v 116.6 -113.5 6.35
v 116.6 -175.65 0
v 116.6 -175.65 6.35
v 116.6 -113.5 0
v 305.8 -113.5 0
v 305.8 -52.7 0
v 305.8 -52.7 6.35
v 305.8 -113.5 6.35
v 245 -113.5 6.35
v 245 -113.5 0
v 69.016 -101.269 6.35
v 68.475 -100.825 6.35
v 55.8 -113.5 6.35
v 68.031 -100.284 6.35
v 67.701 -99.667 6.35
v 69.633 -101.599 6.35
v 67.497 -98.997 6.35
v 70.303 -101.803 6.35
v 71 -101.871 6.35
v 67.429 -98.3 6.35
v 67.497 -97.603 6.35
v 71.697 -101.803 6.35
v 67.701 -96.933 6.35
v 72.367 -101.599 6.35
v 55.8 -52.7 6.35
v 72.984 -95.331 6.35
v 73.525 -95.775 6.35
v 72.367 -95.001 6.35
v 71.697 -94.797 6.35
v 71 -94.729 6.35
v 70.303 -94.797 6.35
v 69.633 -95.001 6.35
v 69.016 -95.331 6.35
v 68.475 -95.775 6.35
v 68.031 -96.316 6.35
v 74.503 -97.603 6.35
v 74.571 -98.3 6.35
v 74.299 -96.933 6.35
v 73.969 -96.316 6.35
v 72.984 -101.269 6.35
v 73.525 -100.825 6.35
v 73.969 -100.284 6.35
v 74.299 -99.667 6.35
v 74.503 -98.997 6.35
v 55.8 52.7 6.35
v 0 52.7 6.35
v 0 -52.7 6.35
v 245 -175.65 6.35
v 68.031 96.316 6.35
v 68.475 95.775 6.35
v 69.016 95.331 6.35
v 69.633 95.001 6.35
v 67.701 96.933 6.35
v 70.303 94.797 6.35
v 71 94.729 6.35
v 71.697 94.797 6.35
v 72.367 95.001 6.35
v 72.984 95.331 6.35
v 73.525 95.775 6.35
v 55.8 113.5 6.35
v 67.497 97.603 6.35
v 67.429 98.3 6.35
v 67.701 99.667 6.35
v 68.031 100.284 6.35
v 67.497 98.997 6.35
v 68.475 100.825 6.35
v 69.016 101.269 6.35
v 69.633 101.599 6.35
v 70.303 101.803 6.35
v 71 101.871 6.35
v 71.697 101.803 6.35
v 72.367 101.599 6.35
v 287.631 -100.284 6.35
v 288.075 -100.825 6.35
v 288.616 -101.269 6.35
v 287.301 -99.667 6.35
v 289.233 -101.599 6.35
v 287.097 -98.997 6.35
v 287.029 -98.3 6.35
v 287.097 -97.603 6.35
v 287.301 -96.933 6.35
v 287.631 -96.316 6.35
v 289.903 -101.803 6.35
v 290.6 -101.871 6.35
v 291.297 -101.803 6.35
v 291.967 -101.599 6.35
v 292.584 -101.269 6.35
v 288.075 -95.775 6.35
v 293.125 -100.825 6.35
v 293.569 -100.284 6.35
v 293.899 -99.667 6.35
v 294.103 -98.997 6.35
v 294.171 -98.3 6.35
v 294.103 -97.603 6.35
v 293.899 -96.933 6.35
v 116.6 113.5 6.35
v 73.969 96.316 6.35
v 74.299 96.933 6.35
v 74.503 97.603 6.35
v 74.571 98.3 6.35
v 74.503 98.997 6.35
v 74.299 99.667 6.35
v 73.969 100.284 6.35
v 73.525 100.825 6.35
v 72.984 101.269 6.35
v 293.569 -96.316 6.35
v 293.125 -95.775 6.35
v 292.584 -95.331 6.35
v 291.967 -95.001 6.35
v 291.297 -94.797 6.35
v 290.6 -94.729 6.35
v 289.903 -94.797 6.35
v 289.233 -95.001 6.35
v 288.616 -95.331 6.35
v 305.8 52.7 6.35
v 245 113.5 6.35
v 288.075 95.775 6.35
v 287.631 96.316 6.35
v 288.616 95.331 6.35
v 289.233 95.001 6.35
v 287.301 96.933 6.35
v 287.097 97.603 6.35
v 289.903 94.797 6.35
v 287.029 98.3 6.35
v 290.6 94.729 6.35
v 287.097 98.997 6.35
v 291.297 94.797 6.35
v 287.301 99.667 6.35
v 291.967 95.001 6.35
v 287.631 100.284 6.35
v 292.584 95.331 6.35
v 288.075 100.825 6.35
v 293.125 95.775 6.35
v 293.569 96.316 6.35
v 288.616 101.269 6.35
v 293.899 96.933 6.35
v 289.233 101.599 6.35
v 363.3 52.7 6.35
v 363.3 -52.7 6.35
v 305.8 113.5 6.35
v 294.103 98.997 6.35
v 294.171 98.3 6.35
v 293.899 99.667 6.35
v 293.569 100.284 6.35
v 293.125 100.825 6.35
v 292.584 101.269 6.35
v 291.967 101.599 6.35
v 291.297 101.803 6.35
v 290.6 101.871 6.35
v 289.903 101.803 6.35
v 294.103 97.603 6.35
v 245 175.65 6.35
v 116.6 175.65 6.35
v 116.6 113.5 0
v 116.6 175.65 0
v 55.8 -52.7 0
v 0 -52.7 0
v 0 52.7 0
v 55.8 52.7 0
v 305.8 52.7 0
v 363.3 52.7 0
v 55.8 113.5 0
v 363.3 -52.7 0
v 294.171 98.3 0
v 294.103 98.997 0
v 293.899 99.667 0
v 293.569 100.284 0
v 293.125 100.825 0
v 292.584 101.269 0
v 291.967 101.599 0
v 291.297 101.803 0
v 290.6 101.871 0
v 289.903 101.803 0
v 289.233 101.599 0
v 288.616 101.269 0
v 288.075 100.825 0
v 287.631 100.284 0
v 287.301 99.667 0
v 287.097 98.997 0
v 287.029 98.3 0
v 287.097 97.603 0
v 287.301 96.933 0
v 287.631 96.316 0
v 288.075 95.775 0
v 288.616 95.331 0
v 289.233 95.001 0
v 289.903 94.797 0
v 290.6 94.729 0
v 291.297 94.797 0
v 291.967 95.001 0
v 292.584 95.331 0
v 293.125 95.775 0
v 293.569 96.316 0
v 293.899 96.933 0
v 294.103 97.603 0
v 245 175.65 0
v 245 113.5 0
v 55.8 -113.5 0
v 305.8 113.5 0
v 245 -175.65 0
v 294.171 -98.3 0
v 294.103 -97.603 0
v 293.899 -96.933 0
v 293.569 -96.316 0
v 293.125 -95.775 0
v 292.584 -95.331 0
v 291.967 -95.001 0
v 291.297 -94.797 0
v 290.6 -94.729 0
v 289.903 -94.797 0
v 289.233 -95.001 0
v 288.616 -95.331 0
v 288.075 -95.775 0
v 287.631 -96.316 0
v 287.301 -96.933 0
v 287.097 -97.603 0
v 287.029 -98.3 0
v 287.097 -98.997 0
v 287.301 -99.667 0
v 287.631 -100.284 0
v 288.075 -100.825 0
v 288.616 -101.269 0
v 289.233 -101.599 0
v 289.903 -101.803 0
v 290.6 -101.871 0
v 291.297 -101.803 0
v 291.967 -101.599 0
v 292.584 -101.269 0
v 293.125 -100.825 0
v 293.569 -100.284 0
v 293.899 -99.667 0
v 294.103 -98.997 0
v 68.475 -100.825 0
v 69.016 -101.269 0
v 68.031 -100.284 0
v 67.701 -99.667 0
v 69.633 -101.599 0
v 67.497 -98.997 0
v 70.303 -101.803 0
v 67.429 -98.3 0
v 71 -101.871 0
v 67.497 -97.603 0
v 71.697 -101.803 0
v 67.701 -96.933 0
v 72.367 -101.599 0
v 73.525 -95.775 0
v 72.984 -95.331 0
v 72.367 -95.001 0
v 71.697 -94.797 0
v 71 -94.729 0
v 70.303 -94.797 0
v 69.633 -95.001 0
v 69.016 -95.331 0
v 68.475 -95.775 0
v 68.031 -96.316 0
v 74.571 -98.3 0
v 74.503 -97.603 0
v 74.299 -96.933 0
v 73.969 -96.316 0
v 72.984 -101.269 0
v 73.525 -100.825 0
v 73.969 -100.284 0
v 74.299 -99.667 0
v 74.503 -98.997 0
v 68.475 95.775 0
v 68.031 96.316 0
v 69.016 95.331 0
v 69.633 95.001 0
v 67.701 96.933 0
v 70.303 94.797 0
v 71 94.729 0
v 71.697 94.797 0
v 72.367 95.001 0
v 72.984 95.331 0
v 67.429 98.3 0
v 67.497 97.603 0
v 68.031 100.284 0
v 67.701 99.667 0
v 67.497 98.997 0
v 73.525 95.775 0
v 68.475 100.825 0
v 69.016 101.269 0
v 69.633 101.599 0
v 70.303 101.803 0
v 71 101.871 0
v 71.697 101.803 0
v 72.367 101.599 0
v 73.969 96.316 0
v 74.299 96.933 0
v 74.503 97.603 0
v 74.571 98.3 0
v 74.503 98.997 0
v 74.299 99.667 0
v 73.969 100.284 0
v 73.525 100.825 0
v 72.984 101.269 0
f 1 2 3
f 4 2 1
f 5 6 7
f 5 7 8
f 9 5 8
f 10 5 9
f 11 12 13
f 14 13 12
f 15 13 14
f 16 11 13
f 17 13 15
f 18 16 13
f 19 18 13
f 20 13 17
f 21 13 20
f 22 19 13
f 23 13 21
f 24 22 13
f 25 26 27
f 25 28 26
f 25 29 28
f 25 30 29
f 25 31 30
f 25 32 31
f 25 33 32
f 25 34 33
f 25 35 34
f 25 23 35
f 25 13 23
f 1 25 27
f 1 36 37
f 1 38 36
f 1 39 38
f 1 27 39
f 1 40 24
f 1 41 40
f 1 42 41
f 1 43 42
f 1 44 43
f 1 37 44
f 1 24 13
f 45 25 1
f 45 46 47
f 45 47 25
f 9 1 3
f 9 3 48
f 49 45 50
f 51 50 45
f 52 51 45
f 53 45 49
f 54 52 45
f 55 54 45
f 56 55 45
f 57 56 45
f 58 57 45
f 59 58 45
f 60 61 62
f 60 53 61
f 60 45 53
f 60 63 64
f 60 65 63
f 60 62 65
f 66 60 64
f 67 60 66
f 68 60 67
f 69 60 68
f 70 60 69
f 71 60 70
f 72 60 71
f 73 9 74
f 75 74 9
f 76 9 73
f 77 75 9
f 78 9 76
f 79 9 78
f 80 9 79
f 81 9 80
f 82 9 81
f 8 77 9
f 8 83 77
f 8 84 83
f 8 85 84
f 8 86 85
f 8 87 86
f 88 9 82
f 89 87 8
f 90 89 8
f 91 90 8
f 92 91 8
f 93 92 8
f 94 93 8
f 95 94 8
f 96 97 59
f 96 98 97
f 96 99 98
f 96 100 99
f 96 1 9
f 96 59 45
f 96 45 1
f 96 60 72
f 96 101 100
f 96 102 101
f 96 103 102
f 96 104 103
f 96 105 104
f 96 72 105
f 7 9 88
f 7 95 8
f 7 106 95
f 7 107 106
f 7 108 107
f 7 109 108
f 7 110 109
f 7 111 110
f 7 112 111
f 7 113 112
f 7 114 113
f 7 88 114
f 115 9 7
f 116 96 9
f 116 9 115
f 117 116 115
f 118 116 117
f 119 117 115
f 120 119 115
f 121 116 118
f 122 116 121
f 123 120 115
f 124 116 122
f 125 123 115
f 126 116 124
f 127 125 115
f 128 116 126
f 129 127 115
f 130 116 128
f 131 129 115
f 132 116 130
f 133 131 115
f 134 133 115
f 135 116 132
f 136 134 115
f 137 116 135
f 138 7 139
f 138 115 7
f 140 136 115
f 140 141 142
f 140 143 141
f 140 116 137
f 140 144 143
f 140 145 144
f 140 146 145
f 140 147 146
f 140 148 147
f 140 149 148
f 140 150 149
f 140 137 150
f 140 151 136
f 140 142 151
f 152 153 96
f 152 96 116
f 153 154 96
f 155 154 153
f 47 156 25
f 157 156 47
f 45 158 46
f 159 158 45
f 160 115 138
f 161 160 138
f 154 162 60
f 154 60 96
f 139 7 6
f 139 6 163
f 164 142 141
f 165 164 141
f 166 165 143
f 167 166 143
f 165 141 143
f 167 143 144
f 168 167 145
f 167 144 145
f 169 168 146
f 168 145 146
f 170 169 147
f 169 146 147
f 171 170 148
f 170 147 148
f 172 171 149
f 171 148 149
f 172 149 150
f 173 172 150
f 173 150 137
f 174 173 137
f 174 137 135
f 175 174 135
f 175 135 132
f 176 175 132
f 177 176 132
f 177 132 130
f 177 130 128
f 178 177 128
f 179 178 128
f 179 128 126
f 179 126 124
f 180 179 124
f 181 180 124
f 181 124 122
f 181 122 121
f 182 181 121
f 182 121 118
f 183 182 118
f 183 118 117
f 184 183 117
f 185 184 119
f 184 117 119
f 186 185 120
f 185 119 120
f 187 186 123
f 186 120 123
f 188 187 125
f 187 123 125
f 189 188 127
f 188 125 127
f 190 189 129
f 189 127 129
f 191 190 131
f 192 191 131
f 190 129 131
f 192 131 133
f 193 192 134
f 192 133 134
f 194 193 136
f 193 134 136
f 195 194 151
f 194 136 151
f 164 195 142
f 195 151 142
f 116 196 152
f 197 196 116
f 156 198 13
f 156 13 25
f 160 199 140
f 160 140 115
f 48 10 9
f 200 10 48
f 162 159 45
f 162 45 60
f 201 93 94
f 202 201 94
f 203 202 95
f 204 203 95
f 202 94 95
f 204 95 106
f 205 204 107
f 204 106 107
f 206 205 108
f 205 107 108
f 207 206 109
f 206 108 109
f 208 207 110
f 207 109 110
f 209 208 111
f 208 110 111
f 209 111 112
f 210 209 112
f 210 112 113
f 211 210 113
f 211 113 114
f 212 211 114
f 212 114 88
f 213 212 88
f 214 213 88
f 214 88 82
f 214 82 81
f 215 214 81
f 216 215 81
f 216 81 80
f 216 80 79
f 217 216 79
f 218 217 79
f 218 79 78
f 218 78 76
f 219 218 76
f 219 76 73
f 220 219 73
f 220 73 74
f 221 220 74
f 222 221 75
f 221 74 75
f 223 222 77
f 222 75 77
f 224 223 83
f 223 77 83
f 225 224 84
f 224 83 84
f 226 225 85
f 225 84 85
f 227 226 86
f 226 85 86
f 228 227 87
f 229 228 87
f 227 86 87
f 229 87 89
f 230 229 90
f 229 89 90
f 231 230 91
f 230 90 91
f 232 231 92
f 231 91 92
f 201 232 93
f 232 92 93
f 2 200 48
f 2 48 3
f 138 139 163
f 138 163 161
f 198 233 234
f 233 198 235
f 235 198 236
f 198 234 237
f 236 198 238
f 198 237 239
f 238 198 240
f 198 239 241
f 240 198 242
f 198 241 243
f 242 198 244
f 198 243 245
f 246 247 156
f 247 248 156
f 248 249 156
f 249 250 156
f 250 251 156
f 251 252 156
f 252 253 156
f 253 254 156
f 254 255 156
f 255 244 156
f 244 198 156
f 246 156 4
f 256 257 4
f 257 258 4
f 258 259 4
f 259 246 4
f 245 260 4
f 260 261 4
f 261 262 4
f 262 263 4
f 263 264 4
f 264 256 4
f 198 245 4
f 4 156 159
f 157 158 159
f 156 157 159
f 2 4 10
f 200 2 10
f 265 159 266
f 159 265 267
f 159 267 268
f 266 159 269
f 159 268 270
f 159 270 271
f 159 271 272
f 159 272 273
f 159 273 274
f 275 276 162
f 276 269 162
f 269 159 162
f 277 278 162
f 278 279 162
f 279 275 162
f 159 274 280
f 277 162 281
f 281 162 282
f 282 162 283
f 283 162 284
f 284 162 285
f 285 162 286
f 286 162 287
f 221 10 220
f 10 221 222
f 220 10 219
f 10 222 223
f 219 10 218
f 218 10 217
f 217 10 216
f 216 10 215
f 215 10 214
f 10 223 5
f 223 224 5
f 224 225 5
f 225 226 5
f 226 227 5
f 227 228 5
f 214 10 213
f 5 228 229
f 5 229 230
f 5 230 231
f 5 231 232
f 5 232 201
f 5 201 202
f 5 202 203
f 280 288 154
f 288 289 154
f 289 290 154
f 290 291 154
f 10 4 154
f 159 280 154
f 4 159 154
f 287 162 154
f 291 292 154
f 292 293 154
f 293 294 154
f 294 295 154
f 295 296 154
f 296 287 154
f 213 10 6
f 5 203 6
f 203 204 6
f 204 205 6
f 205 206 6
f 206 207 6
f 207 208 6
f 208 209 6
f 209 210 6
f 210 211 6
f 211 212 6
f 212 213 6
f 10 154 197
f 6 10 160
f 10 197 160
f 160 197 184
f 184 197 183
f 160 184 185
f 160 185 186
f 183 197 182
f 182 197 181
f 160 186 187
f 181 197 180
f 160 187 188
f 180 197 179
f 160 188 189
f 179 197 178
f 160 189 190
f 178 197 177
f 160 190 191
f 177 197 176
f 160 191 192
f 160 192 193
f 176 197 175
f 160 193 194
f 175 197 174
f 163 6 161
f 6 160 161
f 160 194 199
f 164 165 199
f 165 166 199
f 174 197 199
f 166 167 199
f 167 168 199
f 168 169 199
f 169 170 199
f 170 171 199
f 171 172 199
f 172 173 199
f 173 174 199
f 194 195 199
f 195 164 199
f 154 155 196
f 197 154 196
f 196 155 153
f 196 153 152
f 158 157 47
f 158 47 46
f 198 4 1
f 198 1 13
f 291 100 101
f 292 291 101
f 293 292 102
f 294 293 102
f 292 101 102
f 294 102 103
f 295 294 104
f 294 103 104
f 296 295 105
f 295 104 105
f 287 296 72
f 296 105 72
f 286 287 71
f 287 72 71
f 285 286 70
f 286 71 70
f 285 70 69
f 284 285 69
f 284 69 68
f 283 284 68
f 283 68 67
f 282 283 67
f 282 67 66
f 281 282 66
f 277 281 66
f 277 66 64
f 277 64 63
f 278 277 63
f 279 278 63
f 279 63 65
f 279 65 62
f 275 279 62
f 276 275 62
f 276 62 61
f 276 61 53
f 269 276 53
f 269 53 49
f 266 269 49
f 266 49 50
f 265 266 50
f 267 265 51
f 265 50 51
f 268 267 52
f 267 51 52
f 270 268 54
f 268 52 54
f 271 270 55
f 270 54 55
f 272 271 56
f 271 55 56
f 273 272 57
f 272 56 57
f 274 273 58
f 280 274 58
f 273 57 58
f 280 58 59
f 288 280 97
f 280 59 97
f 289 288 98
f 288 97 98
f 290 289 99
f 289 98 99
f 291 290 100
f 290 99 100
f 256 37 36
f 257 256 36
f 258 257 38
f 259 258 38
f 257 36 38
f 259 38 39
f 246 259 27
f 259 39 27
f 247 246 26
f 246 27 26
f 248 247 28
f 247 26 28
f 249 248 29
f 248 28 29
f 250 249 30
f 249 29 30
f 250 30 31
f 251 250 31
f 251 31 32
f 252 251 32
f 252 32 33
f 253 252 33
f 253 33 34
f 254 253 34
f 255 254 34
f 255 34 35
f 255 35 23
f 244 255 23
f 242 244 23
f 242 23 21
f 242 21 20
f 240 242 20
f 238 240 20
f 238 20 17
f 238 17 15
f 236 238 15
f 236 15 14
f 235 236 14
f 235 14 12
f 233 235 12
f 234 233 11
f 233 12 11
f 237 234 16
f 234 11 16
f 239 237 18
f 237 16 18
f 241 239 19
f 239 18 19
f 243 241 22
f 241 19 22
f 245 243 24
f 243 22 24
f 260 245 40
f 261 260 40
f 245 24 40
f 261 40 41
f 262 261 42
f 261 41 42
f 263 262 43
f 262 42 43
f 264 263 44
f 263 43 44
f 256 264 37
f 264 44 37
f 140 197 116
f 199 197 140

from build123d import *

# Parameters (mm, degrees)
BOSS_EXTRU_1_DEPTH = 6.35
ESQUISSE2_W        = 1.2
ESQUISSE2_H        = 105.4
BOSS_EXTRU_2_DEPTH = 6.35
D_GAGEMENT_1_41_D  = 7.14248


with BuildPart() as part:
    # Esquisse1 → Boss.-Extru.1 (new body)
    with BuildSketch(Plane.XY):
        Polygon((55.8, 113.5), (116.6, 113.5), (116.6, 175.65), (245, 175.65), (245, 113.5), (305.8, 113.5), (305.8, 52.7), (362.1, 52.7), (362.1, -52.7), (305.8, -52.7), (305.8, -113.5), (245, -113.5), (245, -175.65), (116.6, -175.65), (116.6, -113.5), (55.8, -113.5), (55.8, -52.7), (0, -52.7), (0, 52.7), (55.8, 52.7), align=None)
    extrude(amount=BOSS_EXTRU_1_DEPTH)

    # Esquisse2 → Boss.-Extru.2 (add, through all)
    with BuildSketch(Plane.XY.offset(6.35)):
        with Locations((362.7, 0)):
            Rectangle(ESQUISSE2_W, ESQUISSE2_H)
    extrude(amount=-BOSS_EXTRU_2_DEPTH)

    # Dégagement 1/41 (through all)
    with Locations(Plane(origin=(0, 0, 0), x_dir=(-1, 0, 0), z_dir=(0, 0, -1))):
        with Locations((-290.6, 98.3), (-71, 98.3), (-71, -98.3), (-290.6, -98.3)):
            Hole(D_GAGEMENT_1_41_D / 2)


solid = part.part
